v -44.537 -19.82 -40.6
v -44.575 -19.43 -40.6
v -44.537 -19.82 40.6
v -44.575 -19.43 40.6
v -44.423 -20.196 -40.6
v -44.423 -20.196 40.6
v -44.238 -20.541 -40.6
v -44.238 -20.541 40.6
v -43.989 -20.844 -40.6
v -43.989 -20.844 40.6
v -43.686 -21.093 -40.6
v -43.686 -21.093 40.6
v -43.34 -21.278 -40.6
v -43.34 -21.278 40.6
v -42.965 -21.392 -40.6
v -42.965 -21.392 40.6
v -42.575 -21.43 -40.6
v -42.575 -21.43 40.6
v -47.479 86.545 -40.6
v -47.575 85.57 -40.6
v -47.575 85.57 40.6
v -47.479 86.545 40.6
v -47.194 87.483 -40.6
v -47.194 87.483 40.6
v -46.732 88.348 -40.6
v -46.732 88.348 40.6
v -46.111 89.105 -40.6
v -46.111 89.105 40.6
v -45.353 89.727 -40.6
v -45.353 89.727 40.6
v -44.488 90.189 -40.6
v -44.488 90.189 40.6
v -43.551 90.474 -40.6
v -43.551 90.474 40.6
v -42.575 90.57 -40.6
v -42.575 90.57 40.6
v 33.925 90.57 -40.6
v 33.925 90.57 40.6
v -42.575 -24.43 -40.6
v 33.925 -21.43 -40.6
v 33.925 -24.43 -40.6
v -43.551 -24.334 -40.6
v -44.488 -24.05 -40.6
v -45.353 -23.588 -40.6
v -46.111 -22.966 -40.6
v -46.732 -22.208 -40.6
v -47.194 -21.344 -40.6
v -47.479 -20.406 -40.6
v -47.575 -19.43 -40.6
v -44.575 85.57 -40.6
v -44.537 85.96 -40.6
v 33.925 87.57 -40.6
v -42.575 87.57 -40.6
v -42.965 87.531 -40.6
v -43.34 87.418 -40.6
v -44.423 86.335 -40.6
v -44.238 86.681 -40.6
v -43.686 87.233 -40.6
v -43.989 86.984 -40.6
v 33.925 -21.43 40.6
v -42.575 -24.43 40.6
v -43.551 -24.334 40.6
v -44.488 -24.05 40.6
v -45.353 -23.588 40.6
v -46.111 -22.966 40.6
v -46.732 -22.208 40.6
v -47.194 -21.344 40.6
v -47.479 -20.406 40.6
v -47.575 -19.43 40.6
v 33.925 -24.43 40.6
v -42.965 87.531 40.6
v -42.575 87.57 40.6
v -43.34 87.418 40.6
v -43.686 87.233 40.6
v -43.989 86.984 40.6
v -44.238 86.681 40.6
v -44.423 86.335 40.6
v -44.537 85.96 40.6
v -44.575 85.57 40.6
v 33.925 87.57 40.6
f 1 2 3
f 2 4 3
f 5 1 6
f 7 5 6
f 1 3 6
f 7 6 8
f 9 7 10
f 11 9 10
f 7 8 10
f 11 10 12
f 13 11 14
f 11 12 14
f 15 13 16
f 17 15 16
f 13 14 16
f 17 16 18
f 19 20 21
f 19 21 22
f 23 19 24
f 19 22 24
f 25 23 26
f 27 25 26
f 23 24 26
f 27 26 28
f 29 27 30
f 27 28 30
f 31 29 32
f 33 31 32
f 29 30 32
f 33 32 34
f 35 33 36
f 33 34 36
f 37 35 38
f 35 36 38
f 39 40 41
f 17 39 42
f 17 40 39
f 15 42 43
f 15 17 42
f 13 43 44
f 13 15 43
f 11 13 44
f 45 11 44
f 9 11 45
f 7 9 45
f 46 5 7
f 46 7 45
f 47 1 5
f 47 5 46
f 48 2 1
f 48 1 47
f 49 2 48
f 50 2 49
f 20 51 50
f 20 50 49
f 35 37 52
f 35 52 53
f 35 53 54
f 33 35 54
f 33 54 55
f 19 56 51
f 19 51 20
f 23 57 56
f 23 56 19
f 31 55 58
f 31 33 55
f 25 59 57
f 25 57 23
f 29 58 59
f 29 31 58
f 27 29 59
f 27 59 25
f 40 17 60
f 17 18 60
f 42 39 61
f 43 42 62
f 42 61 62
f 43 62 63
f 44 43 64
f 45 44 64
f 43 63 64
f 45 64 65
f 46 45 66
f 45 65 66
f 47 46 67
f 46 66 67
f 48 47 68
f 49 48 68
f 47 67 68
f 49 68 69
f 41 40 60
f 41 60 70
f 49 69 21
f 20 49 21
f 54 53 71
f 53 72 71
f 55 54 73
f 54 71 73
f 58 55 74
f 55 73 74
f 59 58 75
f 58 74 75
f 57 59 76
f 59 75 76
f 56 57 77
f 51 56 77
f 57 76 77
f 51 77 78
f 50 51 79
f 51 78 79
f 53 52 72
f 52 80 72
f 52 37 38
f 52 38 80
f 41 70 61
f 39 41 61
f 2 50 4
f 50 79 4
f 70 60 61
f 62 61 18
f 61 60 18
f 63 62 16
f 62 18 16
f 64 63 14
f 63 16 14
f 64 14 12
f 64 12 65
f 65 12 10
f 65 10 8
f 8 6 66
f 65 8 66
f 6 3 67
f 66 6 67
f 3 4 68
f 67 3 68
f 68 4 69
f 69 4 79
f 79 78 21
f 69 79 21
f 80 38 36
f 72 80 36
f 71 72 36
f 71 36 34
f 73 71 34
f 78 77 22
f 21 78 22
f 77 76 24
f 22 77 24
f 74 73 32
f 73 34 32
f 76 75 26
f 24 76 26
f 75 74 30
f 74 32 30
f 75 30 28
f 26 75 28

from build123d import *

# Parameters (mm, degrees)
EXTRUSION1_DEPTH = 40.6


with BuildPart() as part:
    # Esquisse1 → Extrusion1 (new, symmetric)
    with BuildSketch(Plane.XY):
        with BuildLine():
            Line((-47.575077806, -19.430156076), (-47.575077806, 85.569843924))
            ThreePointArc((-47.575077806, 85.569843924), (-46.110611712, 89.10537783), (-42.575077806, 90.569843924))
            Line((-42.575077806, 90.569843924), (33.924922194, 90.569843924))
            Line((33.924922194, 90.569843924), (33.924922194, 87.569843924))
            Line((33.924922194, 87.569843924), (-42.575077806, 87.569843924))
            ThreePointArc((-42.575077806, 87.569843924), (-43.989291368, 86.984057487), (-44.575077806, 85.569843924))
            Line((-44.575077806, 85.569843924), (-44.575077806, -19.430156076))
            ThreePointArc((-44.575077806, -19.430156076), (-43.989291368, -20.844369638), (-42.575077806, -21.430156076))
            Line((-42.575077806, -21.430156076), (33.924922194, -21.430156076))
            Line((33.924922194, -21.430156076), (33.924922194, -24.430156076))
            Line((33.924922194, -24.430156076), (-42.575077806, -24.430156076))
            ThreePointArc((-42.575077806, -24.430156076), (-46.110611712, -22.965689982), (-47.575077806, -19.430156076))
        make_face()
    extrude(amount=EXTRUSION1_DEPTH, both=True)


solid = part.part
